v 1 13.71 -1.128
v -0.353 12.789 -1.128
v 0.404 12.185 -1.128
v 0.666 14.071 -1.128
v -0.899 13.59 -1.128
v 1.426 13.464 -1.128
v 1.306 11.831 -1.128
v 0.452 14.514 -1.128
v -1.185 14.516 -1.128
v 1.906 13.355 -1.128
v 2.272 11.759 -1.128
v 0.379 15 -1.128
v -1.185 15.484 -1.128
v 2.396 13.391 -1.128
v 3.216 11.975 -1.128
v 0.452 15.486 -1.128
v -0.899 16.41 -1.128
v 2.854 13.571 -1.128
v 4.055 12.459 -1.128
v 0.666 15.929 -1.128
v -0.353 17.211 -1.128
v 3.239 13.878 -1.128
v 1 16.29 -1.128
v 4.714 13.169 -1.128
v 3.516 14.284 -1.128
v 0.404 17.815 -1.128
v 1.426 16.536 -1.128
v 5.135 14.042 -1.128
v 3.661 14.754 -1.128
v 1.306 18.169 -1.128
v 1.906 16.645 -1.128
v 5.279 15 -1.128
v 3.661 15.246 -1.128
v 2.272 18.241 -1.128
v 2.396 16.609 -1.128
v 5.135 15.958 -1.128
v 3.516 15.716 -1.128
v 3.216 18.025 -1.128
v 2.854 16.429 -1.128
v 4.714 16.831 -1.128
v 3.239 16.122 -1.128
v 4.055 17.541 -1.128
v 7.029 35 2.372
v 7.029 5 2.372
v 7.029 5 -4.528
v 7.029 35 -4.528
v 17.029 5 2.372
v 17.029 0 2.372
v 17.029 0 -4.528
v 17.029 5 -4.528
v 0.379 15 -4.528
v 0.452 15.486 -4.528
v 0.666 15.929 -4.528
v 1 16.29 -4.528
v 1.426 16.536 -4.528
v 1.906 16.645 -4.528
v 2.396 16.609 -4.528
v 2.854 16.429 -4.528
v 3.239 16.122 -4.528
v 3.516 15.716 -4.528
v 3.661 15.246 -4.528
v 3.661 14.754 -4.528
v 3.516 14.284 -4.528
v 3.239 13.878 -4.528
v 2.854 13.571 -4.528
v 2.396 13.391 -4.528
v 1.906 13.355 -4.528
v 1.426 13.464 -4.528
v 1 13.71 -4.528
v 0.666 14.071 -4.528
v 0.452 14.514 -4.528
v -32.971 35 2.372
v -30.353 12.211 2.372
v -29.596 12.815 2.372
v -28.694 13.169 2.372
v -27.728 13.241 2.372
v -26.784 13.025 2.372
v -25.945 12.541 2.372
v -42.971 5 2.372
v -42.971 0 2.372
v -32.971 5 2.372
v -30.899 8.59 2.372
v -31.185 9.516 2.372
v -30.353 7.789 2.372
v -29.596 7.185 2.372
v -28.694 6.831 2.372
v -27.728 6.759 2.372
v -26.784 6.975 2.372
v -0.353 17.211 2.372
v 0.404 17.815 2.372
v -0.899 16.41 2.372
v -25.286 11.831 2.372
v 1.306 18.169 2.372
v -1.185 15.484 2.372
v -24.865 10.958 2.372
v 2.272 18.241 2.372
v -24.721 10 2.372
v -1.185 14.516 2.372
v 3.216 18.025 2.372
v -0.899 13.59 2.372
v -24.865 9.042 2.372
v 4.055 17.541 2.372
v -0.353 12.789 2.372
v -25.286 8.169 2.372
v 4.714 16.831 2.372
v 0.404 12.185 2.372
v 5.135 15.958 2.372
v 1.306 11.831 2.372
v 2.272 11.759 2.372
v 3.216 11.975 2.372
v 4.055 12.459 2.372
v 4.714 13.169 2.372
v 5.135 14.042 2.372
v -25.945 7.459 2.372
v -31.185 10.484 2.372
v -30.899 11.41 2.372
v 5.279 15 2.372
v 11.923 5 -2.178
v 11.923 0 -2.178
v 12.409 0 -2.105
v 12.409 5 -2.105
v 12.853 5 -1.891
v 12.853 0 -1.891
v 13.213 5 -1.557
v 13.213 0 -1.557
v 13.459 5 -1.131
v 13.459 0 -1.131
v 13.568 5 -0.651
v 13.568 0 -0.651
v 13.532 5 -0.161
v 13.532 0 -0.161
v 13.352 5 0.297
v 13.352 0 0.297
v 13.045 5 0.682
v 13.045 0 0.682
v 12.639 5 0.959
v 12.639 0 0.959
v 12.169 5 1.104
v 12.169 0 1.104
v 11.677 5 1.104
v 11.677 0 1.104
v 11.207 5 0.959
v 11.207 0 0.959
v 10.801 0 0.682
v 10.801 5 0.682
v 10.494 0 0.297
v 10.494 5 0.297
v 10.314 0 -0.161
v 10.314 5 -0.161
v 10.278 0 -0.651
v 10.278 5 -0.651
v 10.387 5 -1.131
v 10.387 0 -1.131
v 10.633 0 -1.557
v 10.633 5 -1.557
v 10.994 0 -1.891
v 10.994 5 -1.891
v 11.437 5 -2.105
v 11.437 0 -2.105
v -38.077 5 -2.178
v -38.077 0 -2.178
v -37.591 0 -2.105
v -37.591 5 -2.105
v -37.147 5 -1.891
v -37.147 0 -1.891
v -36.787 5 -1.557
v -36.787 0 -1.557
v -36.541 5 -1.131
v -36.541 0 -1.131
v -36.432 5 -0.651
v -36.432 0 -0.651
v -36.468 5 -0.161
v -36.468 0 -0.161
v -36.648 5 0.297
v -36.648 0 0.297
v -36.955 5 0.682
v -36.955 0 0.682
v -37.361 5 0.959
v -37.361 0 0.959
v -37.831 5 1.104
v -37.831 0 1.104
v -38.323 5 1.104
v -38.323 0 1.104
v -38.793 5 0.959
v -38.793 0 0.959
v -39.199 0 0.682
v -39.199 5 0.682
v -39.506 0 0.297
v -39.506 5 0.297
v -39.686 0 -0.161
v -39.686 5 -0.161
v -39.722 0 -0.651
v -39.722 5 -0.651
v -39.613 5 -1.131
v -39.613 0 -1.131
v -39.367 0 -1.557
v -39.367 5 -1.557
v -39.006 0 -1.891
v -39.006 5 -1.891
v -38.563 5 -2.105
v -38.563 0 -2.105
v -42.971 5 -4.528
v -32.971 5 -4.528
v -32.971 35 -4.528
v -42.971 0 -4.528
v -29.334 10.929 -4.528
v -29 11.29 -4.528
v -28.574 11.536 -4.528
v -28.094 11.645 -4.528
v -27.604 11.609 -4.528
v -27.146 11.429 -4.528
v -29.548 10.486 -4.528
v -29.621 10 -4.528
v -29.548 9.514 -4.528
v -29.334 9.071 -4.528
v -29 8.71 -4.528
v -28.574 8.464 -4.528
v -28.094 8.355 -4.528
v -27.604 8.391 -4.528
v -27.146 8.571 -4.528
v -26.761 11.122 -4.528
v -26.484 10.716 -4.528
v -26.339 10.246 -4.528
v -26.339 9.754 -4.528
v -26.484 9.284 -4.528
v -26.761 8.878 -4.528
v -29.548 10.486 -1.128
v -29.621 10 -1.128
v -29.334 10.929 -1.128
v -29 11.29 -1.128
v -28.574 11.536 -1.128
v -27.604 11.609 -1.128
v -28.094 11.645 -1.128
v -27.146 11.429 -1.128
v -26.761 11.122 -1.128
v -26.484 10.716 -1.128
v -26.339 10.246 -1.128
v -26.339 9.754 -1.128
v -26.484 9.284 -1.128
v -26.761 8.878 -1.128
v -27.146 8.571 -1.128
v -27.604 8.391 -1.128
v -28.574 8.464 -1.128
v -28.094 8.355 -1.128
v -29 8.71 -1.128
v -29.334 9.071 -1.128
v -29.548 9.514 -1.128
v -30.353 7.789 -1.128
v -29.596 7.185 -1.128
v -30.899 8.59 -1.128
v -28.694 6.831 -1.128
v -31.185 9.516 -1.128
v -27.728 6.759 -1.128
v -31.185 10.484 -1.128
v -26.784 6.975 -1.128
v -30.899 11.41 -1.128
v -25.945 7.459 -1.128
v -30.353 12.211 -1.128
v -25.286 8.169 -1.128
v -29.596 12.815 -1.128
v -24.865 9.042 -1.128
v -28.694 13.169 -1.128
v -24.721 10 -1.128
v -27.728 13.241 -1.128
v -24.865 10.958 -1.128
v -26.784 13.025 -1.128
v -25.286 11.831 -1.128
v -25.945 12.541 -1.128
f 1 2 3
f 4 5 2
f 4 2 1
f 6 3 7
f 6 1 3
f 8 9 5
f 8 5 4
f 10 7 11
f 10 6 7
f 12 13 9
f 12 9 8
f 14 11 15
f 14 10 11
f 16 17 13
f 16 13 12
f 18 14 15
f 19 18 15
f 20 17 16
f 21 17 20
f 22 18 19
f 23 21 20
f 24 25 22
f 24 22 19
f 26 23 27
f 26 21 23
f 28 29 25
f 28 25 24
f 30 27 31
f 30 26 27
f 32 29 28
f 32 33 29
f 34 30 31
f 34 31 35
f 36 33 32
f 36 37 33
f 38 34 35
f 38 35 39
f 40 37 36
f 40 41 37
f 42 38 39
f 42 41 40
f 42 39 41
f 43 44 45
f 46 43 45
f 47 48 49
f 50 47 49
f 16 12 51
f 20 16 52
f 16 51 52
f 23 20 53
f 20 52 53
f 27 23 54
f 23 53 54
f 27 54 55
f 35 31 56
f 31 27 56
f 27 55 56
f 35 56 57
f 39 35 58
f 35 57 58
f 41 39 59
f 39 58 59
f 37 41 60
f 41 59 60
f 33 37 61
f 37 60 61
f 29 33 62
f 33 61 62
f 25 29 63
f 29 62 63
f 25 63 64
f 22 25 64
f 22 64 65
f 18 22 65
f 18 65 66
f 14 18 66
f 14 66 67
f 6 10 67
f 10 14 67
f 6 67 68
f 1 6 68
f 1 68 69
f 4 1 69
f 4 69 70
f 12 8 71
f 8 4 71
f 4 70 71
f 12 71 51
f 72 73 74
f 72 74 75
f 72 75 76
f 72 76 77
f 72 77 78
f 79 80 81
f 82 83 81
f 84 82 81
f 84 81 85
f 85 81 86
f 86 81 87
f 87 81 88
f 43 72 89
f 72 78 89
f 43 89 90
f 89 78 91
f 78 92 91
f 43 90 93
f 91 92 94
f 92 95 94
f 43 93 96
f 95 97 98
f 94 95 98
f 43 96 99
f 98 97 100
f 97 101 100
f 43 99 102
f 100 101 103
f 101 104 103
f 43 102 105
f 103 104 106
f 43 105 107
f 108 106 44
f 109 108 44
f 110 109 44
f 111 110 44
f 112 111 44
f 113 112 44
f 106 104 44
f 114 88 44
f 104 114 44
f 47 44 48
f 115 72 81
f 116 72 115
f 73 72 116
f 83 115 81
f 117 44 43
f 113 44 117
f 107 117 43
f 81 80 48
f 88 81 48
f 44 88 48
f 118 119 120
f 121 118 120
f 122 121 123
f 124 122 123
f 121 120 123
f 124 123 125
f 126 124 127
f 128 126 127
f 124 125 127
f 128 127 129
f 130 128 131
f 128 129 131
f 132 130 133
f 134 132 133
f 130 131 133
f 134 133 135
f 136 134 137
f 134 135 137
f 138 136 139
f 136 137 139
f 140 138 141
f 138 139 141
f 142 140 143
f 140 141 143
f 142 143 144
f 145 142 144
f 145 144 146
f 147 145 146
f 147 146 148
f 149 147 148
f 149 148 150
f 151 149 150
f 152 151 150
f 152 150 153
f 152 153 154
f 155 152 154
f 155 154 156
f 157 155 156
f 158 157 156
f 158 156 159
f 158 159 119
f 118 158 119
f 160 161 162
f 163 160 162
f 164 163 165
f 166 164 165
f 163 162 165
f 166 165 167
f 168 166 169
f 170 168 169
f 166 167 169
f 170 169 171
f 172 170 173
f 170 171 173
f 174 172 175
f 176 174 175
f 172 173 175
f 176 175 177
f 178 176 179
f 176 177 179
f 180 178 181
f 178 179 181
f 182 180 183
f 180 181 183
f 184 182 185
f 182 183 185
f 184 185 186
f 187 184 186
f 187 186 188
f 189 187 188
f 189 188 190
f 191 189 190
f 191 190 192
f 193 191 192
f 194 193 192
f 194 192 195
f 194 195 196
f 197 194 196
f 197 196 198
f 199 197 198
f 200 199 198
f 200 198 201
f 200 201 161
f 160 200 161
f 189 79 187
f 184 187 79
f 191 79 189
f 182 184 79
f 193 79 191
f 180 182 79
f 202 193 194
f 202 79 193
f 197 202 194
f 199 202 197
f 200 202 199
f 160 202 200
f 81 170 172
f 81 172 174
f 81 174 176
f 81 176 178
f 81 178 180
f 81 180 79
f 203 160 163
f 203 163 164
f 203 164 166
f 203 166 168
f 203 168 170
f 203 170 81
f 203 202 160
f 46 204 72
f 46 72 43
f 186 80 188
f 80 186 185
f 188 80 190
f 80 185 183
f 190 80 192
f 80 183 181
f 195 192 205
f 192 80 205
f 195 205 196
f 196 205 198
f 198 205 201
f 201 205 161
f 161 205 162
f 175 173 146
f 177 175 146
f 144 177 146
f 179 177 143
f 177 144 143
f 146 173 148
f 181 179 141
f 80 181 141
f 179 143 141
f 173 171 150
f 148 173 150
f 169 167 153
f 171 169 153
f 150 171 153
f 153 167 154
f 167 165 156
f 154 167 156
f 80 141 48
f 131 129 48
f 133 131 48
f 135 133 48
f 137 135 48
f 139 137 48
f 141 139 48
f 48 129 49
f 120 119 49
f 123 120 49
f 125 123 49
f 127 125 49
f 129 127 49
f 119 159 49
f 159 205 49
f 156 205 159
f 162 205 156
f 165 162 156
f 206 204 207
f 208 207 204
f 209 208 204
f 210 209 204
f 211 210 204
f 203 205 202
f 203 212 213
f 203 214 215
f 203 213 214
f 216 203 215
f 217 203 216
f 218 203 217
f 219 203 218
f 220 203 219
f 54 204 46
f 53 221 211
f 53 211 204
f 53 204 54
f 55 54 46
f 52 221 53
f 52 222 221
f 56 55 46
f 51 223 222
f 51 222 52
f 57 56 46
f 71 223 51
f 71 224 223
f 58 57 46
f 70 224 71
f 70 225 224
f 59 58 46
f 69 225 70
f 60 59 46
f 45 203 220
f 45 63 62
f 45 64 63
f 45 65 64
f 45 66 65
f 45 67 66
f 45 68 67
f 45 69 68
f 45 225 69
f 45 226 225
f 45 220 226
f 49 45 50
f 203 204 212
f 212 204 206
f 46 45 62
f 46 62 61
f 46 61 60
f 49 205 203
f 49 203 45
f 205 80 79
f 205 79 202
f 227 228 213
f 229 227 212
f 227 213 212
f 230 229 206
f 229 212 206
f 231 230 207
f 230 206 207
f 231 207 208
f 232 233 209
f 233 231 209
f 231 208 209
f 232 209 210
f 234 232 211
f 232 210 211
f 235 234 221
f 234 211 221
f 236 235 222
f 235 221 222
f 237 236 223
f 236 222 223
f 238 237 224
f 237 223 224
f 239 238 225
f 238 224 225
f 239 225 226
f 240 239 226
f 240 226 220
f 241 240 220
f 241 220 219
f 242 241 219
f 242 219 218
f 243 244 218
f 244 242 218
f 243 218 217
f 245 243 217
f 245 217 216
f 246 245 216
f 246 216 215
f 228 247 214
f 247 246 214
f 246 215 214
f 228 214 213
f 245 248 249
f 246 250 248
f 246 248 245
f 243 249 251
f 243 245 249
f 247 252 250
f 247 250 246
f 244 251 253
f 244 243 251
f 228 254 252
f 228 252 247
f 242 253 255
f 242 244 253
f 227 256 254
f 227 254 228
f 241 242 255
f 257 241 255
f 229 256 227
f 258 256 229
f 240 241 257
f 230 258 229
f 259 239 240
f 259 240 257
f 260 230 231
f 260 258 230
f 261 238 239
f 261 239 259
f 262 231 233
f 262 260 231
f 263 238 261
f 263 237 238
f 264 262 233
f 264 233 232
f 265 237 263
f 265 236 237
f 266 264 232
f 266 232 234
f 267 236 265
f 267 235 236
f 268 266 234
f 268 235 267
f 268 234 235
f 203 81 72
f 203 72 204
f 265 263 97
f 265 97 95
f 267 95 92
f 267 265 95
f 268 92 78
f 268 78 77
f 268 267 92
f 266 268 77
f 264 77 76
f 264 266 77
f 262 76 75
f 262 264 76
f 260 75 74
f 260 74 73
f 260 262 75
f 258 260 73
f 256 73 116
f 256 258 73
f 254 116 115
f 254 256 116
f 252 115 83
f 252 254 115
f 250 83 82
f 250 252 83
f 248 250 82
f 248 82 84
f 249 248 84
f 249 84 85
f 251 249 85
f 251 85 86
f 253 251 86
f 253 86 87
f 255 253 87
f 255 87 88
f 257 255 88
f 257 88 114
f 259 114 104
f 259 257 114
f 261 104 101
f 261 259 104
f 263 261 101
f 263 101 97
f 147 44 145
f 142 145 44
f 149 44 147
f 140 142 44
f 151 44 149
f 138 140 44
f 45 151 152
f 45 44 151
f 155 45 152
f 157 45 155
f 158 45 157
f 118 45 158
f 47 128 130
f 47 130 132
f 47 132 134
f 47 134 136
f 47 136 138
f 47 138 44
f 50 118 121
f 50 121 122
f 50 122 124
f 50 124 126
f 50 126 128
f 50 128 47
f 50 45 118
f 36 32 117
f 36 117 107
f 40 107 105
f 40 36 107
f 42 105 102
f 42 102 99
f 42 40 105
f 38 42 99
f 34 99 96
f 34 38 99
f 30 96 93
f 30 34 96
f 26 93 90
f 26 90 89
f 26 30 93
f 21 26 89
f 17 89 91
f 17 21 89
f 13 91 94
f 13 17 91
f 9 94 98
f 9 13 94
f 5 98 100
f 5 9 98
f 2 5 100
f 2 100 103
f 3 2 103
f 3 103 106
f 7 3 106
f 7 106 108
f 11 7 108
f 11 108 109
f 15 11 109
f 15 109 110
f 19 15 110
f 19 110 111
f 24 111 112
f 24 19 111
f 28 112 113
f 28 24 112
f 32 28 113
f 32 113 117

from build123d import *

# Parameters (mm, degrees)
SKETCH_1_W          = 60
SKETCH_1_H          = 6.9
EXTRUDE_1_DEPTH     = 5
SKETCH_2_R          = 1.65
CUT_EXTRUDE_1_DEPTH = 10
SKETCH_3_W          = 40
SKETCH_3_H          = 6.9
EXTRUDE_2_DEPTH     = 30
SKETCH_5_R          = 1.65
CUT_EXTRUDE_2_DEPTH = 25
CUT_EXTRUDE_START   = -3.5
SKETCH_6_R          = 3.25
SKETCH_6_R_2        = 1.65
CUT_EXTRUDE_3_DEPTH = 3.5


with BuildPart() as part:
    # 草图1 → 凸台-拉伸1 (new body)
    with BuildSketch(Plane(origin=(0, 0, 0), x_dir=(1, 0, 0), z_dir=(0, 1, 0))):
        with Locations((-12.970884588, 1.077948994)):
            Rectangle(SKETCH_1_W, SKETCH_1_H)
    extrude(amount=EXTRUDE_1_DEPTH)

    # 草图2 → 切除-拉伸1 (cut)
    with BuildSketch(Plane.XZ):
        with Locations(Location((11.923103363, -0.527948994, 0), (0, 0, 270))):
            Circle(SKETCH_2_R)
        with Locations(Location((-38.076896637, -0.527948994, 0), (0, 0, 270))):
            Circle(SKETCH_2_R)
    extrude(amount=-CUT_EXTRUDE_1_DEPTH, mode=Mode.SUBTRACT)

    # 草图3 → 凸台-拉伸2 (add)
    with BuildSketch(Plane(origin=(0, 5, 0), x_dir=(1, 0, 0), z_dir=(0, 1, 0))):
        with Locations((-12.970884588, 1.077948994)):
            Rectangle(SKETCH_3_W, SKETCH_3_H)
    extrude(amount=EXTRUDE_2_DEPTH)

    # 草图5 → 切除-拉伸2 (cut)
    with BuildSketch(Plane(origin=(0, 0, -4.527948994), x_dir=(-1, 0, 0), z_dir=(0, 0, -1))):
        with Locations((27.970884588, 10)):
            Circle(SKETCH_5_R)
        with Locations((-2.029115412, 15)):
            Circle(SKETCH_5_R)
    extrude(amount=-CUT_EXTRUDE_2_DEPTH, mode=Mode.SUBTRACT)

    # 草图6 → 切除-拉伸3 (cut)
    # profile 1 of 2: a face of its own
    with BuildSketch(Plane.XY.offset(2.372051006).offset(CUT_EXTRUDE_START)):
        with Locations((-27.970884588, 10)):
            Circle(SKETCH_6_R)
        with Locations(Location((-27.970884588, 10, 0), (0, 0, 180))):
            Circle(SKETCH_6_R_2, mode=Mode.SUBTRACT)
    # profile 2 of 2: a face of its own
    with BuildSketch(Plane.XY.offset(2.372051006).offset(CUT_EXTRUDE_START)):
        with Locations((2.029115412, 15)):
            Circle(SKETCH_6_R)
        with Locations(Location((2.029115412, 15, 0), (0, 0, 180))):
            Circle(SKETCH_6_R_2, mode=Mode.SUBTRACT)
    extrude(amount=CUT_EXTRUDE_3_DEPTH, mode=Mode.SUBTRACT)


solid = part.part
